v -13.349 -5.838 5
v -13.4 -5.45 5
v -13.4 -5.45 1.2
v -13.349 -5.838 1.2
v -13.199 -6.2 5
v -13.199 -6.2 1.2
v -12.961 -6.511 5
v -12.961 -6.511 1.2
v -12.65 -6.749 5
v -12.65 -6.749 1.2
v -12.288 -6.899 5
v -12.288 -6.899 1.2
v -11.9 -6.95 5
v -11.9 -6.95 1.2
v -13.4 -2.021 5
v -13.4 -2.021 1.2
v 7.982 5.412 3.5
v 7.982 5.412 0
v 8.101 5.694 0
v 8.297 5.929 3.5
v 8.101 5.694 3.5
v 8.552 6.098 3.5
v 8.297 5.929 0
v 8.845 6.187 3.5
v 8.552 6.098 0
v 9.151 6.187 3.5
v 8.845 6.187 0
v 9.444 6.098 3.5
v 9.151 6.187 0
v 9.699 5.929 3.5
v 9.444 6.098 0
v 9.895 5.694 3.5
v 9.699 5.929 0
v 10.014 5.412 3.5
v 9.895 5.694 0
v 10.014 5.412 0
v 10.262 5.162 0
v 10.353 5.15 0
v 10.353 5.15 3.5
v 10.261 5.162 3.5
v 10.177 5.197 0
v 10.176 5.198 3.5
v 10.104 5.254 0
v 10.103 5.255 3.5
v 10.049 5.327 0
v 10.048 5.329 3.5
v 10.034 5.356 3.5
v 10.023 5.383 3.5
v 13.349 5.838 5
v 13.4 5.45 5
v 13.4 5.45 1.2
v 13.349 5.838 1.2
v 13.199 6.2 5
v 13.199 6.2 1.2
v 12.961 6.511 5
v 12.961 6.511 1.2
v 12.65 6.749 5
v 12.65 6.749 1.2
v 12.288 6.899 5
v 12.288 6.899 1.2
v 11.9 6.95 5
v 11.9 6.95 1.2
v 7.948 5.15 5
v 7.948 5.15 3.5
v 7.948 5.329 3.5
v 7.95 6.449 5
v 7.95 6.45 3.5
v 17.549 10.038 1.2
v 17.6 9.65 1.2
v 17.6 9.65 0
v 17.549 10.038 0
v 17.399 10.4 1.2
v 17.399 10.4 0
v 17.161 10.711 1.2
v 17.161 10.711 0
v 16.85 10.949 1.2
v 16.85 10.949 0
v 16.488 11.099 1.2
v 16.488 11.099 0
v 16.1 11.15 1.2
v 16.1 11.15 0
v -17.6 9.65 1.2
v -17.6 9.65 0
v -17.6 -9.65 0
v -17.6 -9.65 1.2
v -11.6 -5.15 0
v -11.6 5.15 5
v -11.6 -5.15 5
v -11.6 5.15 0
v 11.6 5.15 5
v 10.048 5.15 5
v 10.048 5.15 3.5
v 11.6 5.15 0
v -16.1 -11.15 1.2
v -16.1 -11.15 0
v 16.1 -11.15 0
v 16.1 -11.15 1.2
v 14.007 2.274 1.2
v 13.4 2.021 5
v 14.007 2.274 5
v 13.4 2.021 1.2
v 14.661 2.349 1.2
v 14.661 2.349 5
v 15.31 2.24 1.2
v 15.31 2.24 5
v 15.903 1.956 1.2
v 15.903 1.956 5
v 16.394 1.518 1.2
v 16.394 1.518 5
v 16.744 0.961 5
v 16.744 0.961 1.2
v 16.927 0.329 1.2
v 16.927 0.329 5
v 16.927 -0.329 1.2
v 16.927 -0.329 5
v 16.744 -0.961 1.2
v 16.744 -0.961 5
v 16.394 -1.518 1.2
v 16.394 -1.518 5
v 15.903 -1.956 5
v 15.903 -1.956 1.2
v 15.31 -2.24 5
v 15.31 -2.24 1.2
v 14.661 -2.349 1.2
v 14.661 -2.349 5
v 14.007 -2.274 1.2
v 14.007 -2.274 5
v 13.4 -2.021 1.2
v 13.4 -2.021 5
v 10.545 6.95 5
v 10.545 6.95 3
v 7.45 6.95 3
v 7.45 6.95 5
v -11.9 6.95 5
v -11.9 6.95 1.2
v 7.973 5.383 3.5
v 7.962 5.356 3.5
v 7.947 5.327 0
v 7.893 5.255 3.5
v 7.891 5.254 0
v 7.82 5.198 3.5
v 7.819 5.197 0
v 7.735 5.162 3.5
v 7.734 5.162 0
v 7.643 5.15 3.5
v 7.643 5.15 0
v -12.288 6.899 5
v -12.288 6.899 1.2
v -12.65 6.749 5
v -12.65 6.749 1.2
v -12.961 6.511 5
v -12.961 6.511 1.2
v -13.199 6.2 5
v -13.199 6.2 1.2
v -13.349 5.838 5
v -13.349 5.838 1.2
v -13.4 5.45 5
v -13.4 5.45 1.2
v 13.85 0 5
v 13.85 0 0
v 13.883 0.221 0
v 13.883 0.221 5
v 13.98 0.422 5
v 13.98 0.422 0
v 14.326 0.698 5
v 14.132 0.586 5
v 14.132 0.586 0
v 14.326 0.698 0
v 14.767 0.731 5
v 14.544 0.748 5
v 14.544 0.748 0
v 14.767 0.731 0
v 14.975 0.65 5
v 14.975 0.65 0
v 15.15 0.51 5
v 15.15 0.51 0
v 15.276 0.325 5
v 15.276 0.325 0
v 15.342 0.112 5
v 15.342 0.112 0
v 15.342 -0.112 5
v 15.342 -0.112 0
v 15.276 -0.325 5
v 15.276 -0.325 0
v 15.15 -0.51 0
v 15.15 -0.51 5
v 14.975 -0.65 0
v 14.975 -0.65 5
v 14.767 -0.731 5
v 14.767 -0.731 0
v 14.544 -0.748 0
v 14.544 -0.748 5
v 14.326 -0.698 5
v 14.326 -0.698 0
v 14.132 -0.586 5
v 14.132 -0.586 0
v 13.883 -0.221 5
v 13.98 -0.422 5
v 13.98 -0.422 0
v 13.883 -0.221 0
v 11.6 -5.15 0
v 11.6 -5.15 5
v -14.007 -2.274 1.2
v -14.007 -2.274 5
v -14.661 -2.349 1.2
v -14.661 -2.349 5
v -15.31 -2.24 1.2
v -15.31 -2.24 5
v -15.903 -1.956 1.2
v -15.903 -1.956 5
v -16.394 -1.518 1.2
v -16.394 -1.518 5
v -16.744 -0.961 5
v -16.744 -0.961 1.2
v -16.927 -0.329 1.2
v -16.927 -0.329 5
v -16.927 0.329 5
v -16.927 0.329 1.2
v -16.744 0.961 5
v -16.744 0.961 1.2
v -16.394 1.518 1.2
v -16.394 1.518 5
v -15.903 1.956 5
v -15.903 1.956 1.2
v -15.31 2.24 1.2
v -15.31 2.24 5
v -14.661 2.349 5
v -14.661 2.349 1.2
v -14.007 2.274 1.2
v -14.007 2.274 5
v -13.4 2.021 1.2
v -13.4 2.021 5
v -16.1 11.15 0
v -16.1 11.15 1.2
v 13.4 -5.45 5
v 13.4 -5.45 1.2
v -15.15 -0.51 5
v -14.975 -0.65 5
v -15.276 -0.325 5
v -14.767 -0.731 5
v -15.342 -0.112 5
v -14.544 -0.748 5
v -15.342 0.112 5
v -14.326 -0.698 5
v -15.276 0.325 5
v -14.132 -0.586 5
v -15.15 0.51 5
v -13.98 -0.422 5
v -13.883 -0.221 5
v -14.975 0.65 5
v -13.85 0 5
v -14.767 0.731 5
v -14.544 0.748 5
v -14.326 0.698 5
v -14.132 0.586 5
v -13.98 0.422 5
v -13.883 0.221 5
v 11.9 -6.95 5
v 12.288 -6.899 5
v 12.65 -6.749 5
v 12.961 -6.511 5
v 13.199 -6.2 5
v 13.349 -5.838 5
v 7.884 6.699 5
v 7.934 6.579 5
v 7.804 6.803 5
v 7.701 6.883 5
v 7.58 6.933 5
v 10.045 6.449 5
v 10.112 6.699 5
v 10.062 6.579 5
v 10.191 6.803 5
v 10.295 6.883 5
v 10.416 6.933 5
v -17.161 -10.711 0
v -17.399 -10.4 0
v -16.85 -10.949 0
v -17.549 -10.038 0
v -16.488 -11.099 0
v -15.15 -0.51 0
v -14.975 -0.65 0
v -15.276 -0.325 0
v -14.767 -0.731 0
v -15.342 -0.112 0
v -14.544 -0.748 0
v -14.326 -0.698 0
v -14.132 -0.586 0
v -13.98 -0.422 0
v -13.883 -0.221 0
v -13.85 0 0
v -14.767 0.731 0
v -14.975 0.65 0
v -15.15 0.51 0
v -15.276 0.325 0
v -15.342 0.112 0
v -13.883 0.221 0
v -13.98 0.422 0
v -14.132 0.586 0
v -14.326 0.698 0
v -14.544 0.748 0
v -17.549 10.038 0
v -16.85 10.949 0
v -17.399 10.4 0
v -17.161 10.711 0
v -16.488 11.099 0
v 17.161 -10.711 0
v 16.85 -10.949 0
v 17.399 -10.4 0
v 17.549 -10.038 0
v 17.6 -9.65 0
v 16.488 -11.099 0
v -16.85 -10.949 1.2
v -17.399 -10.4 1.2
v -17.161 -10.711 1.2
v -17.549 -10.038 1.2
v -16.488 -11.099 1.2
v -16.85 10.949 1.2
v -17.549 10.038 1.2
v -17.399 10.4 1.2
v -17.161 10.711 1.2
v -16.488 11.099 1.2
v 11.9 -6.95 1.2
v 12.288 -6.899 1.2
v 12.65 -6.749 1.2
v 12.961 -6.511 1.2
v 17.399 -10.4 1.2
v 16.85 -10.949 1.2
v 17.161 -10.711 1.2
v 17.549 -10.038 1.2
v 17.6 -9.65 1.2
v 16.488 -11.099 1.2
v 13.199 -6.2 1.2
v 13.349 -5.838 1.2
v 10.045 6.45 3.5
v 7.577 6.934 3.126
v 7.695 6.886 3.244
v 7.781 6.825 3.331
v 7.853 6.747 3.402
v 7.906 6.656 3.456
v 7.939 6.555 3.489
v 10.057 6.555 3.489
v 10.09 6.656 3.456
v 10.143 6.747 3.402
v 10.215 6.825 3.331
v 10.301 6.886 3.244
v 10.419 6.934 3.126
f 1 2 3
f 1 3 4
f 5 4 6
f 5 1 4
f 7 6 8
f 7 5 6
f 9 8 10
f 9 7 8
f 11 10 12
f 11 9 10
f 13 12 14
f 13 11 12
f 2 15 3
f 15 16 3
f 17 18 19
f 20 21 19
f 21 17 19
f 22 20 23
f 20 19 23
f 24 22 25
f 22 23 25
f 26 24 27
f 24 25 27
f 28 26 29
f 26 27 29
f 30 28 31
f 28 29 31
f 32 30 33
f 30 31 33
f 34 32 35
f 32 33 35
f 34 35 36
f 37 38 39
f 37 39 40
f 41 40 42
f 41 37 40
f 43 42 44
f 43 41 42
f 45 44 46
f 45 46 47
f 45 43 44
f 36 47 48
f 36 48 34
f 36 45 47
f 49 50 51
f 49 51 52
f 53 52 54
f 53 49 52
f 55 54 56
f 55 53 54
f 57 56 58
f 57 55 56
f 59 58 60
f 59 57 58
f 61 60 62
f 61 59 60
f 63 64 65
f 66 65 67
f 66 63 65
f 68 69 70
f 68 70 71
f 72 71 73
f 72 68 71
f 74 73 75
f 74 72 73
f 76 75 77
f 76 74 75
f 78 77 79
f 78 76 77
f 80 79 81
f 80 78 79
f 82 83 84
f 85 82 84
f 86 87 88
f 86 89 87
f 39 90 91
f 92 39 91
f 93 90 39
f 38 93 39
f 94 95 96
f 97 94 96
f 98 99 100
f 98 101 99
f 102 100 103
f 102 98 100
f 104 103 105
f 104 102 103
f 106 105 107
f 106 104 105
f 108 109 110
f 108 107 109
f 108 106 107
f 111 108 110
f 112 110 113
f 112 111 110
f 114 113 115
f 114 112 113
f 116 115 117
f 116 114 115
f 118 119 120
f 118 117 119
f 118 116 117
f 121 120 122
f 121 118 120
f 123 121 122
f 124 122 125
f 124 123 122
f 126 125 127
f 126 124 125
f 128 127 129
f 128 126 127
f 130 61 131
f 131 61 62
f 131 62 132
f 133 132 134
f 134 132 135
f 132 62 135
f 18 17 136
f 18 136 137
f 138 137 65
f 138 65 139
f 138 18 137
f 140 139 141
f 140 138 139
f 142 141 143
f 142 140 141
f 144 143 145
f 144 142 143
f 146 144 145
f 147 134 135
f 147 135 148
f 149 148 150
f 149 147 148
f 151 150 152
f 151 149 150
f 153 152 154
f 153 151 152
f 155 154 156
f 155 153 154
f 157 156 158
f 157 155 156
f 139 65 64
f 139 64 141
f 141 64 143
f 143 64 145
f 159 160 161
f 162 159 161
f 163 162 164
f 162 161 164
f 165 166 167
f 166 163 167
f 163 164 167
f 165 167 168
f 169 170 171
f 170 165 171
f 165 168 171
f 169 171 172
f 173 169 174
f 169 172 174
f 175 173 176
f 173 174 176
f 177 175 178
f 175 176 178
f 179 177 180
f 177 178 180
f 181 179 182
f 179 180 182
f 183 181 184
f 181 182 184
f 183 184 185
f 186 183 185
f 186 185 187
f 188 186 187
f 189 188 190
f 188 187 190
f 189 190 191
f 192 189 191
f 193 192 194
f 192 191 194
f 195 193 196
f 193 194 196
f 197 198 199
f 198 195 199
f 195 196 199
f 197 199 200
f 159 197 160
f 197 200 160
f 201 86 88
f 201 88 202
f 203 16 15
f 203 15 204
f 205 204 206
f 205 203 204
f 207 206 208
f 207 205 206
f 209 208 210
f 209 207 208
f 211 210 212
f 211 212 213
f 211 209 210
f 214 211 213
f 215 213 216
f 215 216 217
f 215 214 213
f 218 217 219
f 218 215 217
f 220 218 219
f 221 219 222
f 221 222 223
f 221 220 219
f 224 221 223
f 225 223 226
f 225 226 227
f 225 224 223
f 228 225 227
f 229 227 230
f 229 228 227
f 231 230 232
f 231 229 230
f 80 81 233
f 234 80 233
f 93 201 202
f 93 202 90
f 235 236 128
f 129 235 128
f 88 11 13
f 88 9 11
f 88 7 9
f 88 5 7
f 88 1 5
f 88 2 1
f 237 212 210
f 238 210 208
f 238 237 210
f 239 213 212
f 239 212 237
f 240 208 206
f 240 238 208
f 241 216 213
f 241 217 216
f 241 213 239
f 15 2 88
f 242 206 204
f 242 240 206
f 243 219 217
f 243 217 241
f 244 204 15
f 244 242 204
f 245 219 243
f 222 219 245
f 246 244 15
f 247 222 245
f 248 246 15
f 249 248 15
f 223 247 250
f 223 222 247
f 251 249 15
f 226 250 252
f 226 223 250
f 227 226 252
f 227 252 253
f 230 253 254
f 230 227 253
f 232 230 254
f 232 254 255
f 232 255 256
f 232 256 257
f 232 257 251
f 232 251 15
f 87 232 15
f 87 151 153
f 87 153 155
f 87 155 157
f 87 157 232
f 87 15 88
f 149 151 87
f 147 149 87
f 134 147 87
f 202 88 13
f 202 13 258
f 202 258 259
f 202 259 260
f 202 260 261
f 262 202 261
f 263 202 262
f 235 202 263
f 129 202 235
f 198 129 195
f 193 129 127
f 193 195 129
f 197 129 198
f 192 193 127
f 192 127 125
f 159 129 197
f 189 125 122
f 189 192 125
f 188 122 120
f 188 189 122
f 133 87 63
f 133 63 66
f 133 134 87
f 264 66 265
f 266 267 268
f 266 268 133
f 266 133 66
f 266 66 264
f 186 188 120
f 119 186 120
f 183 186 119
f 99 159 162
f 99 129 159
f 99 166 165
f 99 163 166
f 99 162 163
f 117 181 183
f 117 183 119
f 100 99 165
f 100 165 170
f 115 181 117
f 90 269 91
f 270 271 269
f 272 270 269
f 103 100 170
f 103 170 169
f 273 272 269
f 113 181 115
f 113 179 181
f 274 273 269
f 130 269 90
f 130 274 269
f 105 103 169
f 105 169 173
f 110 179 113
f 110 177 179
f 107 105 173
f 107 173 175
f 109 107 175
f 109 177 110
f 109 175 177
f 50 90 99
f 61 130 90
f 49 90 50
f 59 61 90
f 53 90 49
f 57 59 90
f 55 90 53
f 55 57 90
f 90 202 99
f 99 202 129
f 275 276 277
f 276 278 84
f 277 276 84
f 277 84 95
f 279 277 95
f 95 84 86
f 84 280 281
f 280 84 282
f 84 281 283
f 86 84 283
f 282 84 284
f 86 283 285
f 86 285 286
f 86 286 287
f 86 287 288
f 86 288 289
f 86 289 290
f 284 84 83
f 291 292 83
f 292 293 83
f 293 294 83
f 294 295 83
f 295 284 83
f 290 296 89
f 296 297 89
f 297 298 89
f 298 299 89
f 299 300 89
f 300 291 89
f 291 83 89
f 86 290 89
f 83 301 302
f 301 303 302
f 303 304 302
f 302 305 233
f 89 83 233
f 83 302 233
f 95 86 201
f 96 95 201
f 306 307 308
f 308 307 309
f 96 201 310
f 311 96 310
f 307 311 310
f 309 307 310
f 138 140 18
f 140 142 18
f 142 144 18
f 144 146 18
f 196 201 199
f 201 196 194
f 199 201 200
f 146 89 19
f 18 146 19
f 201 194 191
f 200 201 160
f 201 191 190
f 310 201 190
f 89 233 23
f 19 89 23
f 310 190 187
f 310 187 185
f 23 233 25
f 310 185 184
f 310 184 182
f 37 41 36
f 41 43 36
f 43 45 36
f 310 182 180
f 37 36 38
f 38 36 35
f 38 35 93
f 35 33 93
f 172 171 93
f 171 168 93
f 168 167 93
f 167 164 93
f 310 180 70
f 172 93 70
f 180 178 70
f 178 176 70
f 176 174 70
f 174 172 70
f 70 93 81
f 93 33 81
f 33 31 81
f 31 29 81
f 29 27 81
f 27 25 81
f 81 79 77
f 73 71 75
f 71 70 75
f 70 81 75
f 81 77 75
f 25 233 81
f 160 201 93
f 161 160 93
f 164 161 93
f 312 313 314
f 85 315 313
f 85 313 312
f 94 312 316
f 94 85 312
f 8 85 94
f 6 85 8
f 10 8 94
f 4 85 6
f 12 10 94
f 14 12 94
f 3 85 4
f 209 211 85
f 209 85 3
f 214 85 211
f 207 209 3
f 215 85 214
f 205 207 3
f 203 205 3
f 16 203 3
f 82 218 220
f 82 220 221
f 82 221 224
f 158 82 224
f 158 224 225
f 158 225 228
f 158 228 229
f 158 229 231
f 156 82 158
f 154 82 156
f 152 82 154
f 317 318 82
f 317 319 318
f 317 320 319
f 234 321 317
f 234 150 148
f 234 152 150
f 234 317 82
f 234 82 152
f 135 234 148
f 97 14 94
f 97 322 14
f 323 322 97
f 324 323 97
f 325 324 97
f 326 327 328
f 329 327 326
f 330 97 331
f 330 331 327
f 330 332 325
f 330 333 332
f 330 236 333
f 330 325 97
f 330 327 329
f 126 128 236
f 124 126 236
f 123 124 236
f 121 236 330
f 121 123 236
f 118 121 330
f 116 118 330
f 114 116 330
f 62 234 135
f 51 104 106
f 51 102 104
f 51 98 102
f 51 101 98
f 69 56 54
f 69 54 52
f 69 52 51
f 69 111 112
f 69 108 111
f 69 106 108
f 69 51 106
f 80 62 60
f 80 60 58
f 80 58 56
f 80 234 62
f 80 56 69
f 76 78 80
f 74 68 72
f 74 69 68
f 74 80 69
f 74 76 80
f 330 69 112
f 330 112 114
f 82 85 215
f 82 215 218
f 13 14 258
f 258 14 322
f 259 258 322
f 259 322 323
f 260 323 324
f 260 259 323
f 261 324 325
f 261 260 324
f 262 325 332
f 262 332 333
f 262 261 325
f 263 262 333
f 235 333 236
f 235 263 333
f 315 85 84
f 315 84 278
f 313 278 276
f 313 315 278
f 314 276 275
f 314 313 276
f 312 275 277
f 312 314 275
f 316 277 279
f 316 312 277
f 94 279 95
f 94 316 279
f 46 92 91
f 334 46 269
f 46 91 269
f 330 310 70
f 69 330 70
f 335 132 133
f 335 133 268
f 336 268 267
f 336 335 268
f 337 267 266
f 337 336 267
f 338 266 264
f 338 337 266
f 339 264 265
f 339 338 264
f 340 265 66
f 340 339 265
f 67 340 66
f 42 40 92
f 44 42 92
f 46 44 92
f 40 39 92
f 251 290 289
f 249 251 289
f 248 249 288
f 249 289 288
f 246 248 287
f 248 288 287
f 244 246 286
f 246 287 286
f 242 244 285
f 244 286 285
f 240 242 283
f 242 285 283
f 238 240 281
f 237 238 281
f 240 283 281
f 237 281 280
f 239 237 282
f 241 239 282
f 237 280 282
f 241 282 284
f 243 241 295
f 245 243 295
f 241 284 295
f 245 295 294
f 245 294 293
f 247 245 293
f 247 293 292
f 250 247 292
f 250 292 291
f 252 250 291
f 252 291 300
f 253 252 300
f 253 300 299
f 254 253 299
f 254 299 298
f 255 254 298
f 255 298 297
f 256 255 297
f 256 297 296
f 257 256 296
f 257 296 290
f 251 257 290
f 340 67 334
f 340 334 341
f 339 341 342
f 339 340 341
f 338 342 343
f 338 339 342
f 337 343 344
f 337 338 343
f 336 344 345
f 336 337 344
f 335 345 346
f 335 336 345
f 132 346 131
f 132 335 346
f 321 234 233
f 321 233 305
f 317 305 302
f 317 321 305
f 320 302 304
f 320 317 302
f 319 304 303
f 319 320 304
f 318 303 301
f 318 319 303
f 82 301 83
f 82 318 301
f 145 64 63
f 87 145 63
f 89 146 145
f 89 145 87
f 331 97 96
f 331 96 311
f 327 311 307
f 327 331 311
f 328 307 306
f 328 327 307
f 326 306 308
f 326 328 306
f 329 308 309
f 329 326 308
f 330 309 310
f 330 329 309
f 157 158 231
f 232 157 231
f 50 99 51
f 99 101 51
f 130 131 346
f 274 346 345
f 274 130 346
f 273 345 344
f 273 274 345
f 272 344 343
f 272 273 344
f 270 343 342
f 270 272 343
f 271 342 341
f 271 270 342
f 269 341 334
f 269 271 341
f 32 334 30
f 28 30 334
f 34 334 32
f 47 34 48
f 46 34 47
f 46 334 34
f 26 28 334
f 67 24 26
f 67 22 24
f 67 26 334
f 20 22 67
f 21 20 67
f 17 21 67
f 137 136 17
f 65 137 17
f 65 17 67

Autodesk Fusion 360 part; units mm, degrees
sketch "Sketch1" plane through (0, 0, 0) normal (0, 0, 1) x (1, 0, 0)
  line L0 (11.6, 5.15) -> (-11.6, 5.15)
  line L1 (-11.6, 5.15) -> (-11.6, -5.15)
  line L2 (-11.6, -5.15) -> (11.6, -5.15)
  line L3 (11.6, -5.15) -> (11.6, 5.15)
  line L4 (11.6, 5.15) -> (-11.6, -5.15) construction
  line L5 (-11.6, 5.15) -> (11.6, -5.15) construction
  line L6 (-17.6, -11.15) -> (17.6, -11.15)
  line L7 (17.6, -11.15) -> (17.6, 11.15)
  line L8 (17.6, 11.15) -> (-17.6, 11.15)
  line L9 (-17.6, 11.15) -> (-17.6, -11.15)
  line L10 (13.4, 6.95) -> (-13.4, 6.95)
  line L11 (-13.4, 6.95) -> (-13.4, -6.95)
  line L12 (-13.4, -6.95) -> (13.4, -6.95)
  line L13 (13.4, -6.95) -> (13.4, 6.95)
  dimension "d1" = 23.2
  dimension "d2" = 10.3
  dimension "d3" = 6
  dimension "d4" = 1.8
extrude "Extrude1" add sketch "Sketch1" along normal blind 7 contours L10 L11 L12 L13
extrude "Extrude2" add sketch "Sketch1" along normal blind 1.2 contours L6 L7 L8 L9
sketch "Sketch2" plane through (0, 0, 0) normal (0, 0, 1) x (1, 0, 0)
  line L0 (-22, 0) -> (23, 0) construction
  circle A0 centre (14.6, 0) radius 0.75 construction
  line L1 (11.6, -5.15) -> (11.6, 5.15) construction
  dimension "d9" = 1.5
  dimension "d10" = 3
sketch "Sketch3" plane through (0, 0, 1.2) normal (0, 0, 1) x (-1, 0, 0)
  line L0 (-13.4, -6.95) -> (-13.4, 6.95)
  line L1 (-13.4, 6.95) -> (13.4, 6.95)
  line L2 (13.4, 6.95) -> (13.4, -6.95)
  line L3 (13.4, -6.95) -> (-13.4, -6.95)
  line L4 (17.6, -11.15) -> (17.6, 11.15)
  line L5 (17.6, 11.15) -> (-17.6, 11.15)
  line L6 (-17.6, 11.15) -> (-17.6, -11.15)
  line L7 (-17.6, -11.15) -> (17.6, -11.15)
  circle A0 centre (-14.6, 0) radius 0.75
  circle A1 centre (-14.6, 0) radius 2.35
  dimension "d11" = 1.6
extrude "Extrude3" add sketch "Sketch3" along normal blind 5 contours L0 A1 picked at (-13.55, 0)
extrude "Extrude9" cut 1 faces at (14.8389, -0.0008, 1.2) along direction (0, 0, -1) up to surface (1.2 mm away)
mirror "Mirror1" about plane through (0, 0, 0) normal (1, 0, 0) of "Extrude2", "Extrude3"
sketch "Sketch4" plane through (0, 0, 0) normal (0, 0, 1) x (1, 0, 0)
  line L0 (11.6, -1) -> (17.6, -1)
  line L1 (17.6, -1) -> (17.6, 0.9)
  line L2 (17.6, 0.9) -> (11.6, 0.9)
  line L3 (11.6, 0.9) -> (11.6, -1)
sketch "Sketch5" plane through (0, 0, 0) normal (0, 0, 1) x (1, 0, 0)
  arc A0 (10.0479, 5.1477) -> (7.9479, 5.146) centre (8.9979, 5.148) ccw
  line L0 (7.9479, 5.146) -> (10.0479, 5.1477)
  dimension "d17" = 1.05
extrude "Extrude4" cut sketch "Sketch5" along normal up to surface (7 mm away)
extrude "Extrude5" add 2 faces at (13.55, 0, 6.2) (-13.55, 0, 6.2) along direction (0, 0, 1) up to surface end surface through (0, 0, 7) normal (0, 0, 1) offset 0
sketch "Sketch6" plane through (0, 0, 7) normal (0, 0, 1) x (-1, 0, 0)
  circle A0 centre (14.6, 0) radius 0.75
  circle A1 centre (-14.6, 0) radius 0.75
  line L0 (-13.4, 6.95) -> (-13.4, 2.0205)
  arc A2 (-13.4, 2.0205) -> (-13.4, -2.0205) centre (-14.6, 0) ccw
  line L1 (-13.4, -2.0205) -> (-13.4, -6.95)
  line L2 (-13.4, -6.95) -> (13.4, -6.95)
  line L3 (13.4, -6.95) -> (13.4, -2.0205)
  arc A3 (13.4, -2.0205) -> (13.4, 2.0205) centre (14.6, 0) ccw
  line L4 (13.4, 2.0205) -> (13.4, 6.95)
  line L5 (13.4, 6.95) -> (-13.4, 6.95)
  arc A4 (-10.0479, -5.15) -> (-7.9479, -5.15) centre (-8.9979, -5.148) ccw
  line L6 (-10.0479, -5.15) -> (-11.6, -5.15)
  line L7 (-11.6, -5.15) -> (-11.6, 5.15)
  line L8 (-11.6, 5.15) -> (11.6, 5.15)
  line L9 (11.6, 5.15) -> (11.6, -5.15)
  line L10 (11.6, -5.15) -> (-7.9479, -5.15)
  line L11 (-10.0479, -5.15) -> (-10.0444, -6.95)
  line L12 (-7.9479, -5.15) -> (-7.9514, -6.95)
extrude "Extrude6" cut sketch "Sketch6" against normal blind 1.5 contours L2 A4 L11 L12
extrude "Extrude7" cut 1 faces at (8.9718, 6.6983, 5.5) along direction (0, 0, -1) blind 2
extrude "Extrude8" cut 1 faces at (-3.8667, -6.35, 7) along direction (0, 0, -1) blind 2
fillet "Fillet1" radius 0.35 2 edges at (7.9479, 5.15, 2.75) (10.0479, 5.15, 2.75)
fillet "Fillet2" radius 1.5 8 edges at (13.4, -6.95, 4.1) (13.4, 6.95, 4.1) (-13.4, -6.95, 4.1) (-13.4, 6.95, 4.1) (17.6, -11.15, 0.6) (-17.6, -11.15, 0.6) (-17.6, 11.15, 0.6) (17.6, 11.15, 0.6)
fillet "Fillet5" radius 0.5 3 edges at (8.9979, 6.95, 3.5) (7.9514, 6.95, 4.25) (10.0444, 6.95, 4.25)
extrude "Extrude10" cut 1 faces at (14.3611, -0.4138, 1.2) along direction (0, 0, -1) blind 2
extrude "Extrude11" cut 1 faces at (-14.4167, 0.2446, 1.2) along direction (0, 0, -1) blind 2
